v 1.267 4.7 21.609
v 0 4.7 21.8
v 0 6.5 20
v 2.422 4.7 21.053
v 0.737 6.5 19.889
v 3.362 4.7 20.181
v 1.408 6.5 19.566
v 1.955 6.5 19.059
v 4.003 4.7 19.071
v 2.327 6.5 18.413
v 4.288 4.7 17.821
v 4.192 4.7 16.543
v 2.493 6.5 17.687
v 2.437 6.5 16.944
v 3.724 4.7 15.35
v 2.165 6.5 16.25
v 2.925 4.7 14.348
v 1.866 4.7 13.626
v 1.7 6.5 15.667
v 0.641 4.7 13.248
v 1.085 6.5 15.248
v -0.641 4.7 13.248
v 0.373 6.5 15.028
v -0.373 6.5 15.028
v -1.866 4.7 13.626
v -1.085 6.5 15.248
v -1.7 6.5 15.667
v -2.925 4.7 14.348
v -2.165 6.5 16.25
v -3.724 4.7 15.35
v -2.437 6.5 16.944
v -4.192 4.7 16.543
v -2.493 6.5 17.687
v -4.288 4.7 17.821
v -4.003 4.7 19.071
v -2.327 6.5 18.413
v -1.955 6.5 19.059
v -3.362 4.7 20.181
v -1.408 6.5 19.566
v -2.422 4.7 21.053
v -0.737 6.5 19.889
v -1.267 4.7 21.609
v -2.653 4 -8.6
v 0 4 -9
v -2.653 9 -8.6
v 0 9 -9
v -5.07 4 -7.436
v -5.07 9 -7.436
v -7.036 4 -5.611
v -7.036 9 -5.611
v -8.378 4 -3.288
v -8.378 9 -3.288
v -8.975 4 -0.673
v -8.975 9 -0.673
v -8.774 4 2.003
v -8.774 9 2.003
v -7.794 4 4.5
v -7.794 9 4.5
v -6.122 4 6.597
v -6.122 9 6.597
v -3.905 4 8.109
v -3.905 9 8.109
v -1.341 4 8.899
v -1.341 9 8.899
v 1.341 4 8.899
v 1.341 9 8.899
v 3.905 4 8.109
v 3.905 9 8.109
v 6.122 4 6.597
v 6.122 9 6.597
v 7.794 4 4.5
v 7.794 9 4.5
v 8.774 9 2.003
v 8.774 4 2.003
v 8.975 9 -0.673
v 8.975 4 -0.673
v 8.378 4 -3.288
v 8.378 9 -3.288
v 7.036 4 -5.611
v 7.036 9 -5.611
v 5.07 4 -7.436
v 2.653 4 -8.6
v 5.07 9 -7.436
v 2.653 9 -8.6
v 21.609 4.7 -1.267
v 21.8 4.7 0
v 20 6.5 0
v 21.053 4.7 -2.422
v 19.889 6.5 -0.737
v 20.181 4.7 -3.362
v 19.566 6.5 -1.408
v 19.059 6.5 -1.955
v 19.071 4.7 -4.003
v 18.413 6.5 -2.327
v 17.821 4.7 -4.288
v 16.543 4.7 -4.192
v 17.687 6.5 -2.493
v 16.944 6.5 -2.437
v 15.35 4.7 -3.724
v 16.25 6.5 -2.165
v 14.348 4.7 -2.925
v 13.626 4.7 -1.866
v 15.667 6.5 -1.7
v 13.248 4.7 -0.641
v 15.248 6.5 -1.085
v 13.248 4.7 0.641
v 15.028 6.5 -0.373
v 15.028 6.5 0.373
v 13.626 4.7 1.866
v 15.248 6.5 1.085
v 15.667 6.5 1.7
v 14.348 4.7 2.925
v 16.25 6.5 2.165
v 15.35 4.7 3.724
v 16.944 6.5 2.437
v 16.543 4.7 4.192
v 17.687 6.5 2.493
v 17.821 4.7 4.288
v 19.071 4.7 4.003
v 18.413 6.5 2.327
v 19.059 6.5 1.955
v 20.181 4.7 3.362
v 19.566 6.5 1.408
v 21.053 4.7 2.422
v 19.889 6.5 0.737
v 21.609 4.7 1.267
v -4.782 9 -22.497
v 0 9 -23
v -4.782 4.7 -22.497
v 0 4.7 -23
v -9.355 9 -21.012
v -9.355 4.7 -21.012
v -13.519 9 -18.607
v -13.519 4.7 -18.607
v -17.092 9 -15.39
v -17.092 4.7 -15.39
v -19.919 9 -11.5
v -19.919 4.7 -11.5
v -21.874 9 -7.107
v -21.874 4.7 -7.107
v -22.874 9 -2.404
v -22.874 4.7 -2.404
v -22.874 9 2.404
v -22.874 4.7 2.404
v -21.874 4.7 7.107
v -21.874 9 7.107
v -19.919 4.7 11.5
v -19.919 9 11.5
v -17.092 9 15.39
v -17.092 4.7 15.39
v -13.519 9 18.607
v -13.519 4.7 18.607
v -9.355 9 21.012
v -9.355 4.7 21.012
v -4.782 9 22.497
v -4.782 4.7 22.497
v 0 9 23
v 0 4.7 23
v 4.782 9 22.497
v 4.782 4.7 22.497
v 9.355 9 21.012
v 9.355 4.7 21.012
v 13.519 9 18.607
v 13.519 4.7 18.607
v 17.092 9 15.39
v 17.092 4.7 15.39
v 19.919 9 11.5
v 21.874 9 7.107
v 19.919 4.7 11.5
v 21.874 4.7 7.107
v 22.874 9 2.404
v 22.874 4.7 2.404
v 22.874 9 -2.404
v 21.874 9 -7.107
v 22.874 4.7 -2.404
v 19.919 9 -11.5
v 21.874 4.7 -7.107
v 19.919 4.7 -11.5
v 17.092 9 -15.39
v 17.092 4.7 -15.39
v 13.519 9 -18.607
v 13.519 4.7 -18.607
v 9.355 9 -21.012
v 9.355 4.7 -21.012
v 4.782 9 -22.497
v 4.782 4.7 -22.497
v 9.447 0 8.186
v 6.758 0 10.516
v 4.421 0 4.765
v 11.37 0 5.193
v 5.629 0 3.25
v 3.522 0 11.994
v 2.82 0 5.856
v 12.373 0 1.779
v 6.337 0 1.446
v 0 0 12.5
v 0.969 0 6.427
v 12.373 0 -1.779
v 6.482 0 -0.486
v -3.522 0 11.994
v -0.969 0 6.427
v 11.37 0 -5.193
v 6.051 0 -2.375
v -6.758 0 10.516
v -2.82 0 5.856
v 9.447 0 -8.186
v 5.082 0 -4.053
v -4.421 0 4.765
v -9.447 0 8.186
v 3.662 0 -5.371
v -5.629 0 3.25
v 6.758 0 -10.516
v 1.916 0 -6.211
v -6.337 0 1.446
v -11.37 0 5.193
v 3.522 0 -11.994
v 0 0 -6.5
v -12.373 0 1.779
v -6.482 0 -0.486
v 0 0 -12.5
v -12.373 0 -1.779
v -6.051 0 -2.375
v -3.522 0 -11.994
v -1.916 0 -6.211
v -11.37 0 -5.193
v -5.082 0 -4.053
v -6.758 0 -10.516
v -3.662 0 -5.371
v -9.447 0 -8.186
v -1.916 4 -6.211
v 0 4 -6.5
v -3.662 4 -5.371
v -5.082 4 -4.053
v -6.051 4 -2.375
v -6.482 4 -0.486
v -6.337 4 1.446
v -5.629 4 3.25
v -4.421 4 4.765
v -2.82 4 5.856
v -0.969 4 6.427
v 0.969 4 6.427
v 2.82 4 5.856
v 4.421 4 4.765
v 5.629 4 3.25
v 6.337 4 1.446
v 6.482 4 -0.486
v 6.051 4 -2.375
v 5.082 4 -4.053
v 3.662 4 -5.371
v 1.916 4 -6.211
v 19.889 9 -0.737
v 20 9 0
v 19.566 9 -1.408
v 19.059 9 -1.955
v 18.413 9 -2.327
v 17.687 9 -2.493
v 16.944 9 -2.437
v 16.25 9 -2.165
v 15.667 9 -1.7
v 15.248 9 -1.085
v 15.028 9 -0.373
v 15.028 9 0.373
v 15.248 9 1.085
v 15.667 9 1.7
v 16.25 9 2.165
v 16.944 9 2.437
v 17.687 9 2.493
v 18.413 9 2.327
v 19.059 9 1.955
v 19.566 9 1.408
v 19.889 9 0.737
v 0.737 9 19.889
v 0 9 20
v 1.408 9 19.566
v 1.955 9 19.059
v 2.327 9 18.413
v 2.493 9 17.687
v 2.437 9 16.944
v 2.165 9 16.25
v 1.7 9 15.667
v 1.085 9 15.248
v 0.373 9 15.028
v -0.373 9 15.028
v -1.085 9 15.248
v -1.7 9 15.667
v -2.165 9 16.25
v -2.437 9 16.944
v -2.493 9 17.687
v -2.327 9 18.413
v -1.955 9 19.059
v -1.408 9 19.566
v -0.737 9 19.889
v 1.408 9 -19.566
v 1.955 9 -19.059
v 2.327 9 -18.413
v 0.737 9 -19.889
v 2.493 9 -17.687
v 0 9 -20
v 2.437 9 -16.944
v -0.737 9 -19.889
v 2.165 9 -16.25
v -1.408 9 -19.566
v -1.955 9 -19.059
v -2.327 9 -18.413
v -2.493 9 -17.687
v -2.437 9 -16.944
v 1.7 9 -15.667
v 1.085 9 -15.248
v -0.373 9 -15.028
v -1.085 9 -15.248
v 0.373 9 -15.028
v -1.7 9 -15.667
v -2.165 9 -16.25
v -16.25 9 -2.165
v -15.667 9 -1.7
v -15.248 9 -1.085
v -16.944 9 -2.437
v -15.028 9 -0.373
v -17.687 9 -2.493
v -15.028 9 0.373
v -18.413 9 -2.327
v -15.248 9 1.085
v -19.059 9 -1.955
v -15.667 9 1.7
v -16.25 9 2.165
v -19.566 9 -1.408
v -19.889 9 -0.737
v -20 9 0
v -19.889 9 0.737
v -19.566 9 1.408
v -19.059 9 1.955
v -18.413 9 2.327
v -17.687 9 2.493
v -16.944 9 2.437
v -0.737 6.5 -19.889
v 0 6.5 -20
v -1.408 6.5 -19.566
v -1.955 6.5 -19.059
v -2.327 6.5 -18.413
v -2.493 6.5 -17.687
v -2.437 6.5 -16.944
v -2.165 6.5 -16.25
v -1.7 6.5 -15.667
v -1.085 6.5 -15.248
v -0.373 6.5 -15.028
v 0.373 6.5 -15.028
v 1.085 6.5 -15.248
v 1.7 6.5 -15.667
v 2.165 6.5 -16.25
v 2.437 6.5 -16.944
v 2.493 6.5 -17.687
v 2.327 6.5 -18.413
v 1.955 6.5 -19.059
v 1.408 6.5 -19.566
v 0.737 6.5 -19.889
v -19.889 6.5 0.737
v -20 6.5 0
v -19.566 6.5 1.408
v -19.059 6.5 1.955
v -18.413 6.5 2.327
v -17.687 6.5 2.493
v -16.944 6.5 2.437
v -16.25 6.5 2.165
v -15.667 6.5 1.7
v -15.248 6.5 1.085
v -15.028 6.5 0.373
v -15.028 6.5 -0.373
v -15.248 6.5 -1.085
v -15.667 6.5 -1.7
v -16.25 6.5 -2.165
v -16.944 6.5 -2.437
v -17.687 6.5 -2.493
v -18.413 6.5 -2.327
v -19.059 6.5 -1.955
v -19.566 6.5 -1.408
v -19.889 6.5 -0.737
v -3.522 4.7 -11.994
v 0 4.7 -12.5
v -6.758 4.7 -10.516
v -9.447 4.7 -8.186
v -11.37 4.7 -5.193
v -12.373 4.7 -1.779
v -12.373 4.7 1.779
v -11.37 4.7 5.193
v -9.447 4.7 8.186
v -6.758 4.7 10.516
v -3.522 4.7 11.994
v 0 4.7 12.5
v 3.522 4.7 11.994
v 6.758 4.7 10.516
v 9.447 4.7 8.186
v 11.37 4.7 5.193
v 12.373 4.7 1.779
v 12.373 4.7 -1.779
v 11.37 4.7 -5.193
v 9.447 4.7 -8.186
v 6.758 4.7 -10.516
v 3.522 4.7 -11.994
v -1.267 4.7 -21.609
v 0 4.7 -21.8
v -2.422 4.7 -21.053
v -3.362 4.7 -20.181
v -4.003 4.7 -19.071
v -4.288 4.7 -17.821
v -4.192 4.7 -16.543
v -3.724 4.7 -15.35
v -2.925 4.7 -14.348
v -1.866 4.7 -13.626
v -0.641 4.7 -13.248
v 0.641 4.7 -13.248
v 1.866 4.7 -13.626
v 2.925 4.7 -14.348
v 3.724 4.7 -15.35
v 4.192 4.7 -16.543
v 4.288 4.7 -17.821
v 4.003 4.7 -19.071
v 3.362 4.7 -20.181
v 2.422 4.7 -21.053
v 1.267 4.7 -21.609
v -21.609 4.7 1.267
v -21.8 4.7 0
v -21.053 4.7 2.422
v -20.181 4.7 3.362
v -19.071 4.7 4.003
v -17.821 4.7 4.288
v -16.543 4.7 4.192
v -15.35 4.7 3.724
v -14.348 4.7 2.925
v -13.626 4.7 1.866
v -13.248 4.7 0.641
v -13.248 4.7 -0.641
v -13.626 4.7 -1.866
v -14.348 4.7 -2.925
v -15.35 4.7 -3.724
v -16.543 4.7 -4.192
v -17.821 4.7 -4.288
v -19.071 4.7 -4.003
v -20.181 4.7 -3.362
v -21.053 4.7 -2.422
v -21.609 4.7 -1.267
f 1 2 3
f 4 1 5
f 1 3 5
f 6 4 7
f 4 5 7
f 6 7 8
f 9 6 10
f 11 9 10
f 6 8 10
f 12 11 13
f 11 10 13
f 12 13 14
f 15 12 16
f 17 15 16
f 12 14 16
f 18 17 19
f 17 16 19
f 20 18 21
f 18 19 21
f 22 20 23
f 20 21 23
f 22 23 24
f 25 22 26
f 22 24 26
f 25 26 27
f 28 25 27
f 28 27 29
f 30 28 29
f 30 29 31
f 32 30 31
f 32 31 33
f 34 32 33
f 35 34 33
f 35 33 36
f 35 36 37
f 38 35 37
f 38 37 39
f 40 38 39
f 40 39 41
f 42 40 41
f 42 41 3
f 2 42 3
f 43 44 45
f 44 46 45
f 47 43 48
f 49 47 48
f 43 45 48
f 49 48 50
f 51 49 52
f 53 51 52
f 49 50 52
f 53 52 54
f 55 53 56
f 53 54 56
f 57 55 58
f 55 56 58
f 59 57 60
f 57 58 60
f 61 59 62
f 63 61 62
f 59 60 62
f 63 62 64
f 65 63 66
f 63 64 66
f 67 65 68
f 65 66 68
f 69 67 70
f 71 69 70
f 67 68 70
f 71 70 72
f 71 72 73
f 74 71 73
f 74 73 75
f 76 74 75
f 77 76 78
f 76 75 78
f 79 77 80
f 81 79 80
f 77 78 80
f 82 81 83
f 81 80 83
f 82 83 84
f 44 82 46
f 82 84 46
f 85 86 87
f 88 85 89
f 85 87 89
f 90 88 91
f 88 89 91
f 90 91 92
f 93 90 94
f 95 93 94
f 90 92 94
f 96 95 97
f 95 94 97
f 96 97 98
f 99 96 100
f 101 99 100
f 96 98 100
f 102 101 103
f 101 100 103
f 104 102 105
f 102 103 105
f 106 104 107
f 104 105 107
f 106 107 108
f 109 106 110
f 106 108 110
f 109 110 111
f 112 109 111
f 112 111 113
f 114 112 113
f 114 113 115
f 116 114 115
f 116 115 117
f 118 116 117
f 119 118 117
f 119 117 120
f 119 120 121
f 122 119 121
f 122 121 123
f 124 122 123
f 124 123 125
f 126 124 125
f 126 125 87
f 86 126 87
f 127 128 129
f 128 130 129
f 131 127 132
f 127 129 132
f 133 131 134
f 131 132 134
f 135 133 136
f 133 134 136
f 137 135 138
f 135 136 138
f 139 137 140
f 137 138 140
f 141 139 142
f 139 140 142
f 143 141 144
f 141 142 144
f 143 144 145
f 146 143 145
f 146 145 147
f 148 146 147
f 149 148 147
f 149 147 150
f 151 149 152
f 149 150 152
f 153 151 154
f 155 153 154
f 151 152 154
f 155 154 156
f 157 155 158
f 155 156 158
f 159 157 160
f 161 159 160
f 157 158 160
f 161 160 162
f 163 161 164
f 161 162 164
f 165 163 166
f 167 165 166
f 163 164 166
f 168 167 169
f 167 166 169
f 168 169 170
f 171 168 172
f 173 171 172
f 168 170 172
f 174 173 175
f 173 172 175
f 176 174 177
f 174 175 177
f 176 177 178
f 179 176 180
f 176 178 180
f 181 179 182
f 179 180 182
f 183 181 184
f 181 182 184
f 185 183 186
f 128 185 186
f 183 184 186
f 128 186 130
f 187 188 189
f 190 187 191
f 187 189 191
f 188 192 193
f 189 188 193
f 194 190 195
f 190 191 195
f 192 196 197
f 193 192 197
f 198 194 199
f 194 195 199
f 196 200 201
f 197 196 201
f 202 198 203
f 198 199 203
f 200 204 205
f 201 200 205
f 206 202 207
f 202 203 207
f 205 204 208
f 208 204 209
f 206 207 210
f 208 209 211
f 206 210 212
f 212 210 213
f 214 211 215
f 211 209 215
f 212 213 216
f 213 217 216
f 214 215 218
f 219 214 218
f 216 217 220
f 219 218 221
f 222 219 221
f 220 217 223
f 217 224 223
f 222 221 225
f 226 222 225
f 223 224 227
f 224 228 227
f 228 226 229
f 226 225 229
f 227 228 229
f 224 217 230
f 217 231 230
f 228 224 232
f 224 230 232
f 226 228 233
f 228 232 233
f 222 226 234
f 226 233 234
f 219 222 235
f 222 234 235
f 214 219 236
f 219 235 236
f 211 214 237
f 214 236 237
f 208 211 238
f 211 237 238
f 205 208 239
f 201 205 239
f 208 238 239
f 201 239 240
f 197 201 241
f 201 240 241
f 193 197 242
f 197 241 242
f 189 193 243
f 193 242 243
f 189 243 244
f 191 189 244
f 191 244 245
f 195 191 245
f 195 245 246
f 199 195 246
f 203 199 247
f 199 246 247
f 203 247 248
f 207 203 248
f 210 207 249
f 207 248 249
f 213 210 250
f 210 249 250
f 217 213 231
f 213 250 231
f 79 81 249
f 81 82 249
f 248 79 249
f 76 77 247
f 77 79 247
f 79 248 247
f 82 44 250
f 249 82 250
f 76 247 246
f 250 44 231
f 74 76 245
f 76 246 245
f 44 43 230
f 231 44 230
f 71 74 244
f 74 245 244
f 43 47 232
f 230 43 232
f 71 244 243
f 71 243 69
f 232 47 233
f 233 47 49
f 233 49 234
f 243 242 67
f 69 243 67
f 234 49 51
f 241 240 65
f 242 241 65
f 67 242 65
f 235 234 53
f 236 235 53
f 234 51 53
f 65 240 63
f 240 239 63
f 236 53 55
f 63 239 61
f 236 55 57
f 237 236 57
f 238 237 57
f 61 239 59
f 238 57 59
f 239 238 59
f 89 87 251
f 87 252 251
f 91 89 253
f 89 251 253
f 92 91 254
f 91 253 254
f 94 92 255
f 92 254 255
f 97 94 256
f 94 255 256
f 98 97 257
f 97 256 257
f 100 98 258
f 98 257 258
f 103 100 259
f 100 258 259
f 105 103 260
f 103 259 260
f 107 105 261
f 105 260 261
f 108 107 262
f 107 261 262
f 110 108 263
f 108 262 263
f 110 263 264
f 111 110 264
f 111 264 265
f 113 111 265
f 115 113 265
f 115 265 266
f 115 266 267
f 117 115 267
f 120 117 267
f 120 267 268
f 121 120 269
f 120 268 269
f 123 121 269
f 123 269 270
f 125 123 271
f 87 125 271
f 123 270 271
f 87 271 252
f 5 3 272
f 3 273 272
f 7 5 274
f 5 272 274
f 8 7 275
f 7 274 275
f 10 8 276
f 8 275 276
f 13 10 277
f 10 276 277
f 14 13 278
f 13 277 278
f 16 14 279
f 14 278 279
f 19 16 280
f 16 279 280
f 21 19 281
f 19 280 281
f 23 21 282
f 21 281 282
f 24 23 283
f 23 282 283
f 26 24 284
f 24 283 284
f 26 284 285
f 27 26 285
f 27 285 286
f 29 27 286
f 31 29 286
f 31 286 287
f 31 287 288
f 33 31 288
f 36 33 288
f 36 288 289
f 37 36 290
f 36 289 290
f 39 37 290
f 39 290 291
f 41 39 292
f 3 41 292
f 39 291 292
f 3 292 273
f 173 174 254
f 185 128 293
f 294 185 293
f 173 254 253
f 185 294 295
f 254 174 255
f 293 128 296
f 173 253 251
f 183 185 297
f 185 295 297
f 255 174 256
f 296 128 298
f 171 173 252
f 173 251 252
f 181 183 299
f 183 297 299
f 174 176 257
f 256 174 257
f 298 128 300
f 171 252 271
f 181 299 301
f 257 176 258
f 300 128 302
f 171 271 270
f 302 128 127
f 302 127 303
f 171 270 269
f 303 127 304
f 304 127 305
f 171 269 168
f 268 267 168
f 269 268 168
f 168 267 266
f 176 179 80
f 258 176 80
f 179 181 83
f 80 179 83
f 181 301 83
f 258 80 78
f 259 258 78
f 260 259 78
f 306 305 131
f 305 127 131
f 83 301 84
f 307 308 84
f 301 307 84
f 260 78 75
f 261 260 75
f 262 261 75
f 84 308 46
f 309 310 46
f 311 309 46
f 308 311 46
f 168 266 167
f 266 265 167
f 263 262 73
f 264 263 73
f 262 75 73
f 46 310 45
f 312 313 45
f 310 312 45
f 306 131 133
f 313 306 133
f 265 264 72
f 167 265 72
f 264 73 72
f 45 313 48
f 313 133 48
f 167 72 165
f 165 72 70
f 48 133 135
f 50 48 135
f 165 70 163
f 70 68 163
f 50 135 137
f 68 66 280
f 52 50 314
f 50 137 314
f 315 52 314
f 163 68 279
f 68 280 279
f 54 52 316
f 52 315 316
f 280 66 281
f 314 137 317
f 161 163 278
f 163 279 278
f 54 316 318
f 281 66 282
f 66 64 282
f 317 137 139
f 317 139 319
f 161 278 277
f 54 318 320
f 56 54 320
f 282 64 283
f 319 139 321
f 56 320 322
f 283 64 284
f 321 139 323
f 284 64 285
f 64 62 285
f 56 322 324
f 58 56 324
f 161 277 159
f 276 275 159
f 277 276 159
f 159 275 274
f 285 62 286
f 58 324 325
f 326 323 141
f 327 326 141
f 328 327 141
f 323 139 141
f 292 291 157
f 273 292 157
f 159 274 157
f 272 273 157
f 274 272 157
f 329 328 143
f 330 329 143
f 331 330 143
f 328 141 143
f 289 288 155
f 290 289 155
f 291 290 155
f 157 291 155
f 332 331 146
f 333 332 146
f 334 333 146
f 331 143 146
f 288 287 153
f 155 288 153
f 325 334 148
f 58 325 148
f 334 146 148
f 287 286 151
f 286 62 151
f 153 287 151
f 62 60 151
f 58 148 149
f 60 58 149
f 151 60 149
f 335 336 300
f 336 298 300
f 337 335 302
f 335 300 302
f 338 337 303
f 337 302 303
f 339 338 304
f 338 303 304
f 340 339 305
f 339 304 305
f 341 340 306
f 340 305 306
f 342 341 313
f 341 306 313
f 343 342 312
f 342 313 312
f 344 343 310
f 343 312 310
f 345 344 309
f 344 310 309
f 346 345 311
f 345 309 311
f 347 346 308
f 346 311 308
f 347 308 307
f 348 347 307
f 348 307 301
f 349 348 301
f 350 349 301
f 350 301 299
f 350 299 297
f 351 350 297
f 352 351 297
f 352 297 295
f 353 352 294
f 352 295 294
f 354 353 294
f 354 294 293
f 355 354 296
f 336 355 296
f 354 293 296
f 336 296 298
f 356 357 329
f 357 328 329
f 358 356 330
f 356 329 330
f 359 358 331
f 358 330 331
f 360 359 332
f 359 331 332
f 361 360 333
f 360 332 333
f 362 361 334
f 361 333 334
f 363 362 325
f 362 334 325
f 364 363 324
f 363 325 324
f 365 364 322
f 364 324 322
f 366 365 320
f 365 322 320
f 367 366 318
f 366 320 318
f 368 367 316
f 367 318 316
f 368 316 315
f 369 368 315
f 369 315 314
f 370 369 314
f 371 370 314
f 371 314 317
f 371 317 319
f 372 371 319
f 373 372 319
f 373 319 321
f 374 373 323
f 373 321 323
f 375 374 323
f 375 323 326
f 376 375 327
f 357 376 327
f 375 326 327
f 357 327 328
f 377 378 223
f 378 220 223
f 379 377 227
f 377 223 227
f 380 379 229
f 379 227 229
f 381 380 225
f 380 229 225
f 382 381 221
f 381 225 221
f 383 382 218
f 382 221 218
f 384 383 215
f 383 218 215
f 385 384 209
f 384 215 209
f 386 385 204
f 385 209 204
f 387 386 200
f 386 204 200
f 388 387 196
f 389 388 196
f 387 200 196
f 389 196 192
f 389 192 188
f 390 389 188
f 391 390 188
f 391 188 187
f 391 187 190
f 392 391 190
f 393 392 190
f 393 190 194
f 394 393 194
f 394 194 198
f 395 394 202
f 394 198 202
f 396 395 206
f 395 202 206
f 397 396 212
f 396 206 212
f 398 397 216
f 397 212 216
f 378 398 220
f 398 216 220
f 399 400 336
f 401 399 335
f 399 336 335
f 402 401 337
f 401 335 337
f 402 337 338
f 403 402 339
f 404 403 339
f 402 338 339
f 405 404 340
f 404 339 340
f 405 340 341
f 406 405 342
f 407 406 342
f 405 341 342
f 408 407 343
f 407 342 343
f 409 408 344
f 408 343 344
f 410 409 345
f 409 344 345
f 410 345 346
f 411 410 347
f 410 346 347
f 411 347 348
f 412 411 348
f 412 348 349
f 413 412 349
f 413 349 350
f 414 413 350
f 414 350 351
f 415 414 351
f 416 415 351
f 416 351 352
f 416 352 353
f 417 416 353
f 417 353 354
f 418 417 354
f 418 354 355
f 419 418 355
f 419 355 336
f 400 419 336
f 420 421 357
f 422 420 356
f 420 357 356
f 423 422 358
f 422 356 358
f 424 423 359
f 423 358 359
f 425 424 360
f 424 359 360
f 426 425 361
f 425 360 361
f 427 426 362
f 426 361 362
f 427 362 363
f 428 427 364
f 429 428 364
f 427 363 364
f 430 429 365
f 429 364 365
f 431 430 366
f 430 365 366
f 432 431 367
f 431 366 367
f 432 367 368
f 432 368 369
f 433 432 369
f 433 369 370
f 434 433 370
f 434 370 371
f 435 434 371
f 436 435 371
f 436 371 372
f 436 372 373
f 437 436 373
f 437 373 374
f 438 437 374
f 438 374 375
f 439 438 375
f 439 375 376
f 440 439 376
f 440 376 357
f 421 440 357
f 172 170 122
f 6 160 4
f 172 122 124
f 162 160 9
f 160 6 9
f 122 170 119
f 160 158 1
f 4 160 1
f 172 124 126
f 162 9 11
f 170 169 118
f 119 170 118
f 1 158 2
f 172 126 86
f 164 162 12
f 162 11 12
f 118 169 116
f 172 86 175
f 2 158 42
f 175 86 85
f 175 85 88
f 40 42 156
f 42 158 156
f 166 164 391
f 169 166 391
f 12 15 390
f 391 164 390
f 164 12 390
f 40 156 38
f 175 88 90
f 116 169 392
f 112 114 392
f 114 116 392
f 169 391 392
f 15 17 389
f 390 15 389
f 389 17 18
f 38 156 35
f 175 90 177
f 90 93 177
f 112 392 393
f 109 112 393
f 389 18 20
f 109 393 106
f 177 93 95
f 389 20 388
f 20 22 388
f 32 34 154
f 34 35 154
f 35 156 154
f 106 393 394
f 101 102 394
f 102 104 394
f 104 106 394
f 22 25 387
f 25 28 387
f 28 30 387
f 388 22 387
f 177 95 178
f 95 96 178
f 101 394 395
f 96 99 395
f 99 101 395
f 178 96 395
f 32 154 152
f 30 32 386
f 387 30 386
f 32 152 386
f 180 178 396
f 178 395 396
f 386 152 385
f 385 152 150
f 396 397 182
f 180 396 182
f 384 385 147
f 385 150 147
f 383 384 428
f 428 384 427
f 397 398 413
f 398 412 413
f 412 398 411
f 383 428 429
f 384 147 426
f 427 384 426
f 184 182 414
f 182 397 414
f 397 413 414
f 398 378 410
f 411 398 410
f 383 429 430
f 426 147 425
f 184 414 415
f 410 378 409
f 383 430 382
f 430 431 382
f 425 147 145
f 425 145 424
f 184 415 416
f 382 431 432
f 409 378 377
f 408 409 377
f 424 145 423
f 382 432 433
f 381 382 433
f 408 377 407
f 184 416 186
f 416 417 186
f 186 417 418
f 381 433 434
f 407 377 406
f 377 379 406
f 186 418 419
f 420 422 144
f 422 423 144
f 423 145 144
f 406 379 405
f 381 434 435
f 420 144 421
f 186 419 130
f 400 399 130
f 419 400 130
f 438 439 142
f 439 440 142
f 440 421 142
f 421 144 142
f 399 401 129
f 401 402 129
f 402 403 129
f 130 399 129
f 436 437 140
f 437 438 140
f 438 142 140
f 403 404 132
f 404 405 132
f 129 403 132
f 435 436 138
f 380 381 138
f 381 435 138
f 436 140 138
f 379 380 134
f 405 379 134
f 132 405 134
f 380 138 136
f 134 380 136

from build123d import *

# Parameters (mm, degrees)
FORO_SVASATO_PER_VITE_M5_1_D           = 5
FORO_SVASATO_PER_VITE_M5_1_CSINK_D     = 8.6
FORO_SVASATO_PER_VITE_M5_1_CSINK_ANGLE = 90
RIPETIZIONECIRCOLARE1_COUNT            = 4


with BuildPart() as part:
    # Schizzo1 → Rivoluzione1 (revolve)
    with BuildSketch(Plane.XY, mode=Mode.PRIVATE) as rivoluzione1_sk:
        Polygon((6.5, 0), (6.5, 4), (9, 4), (9, 9), (23, 9), (23, 4.7), (12.5, 4.7), (12.5, 0), align=None)
    revolve(rivoluzione1_sk.sketch.rotate(Axis((0, 0, 0), (0, 1, 0)), 90), axis=Axis((0, 0, 0), (0, 1, 0)))

    # Foro svasato per Vite M5-1 (through all)
    with Locations(Plane(origin=(0, 4.7, 0), x_dir=(-1, 0, 0), z_dir=(0, -1, 0))):
        with Locations((-17.5, 0)):
            foro_svasato_per_vite_m5_1 = CounterSinkHole(FORO_SVASATO_PER_VITE_M5_1_D / 2, FORO_SVASATO_PER_VITE_M5_1_CSINK_D / 2, counter_sink_angle=FORO_SVASATO_PER_VITE_M5_1_CSINK_ANGLE)

    # RipetizioneCircolare1: Foro svasato per Vite M5-1 ×4 about axis
    ripetizionecircolare1_axis = Axis((0, 0, 0), (0, 1, 0))
    for i in range(1, RIPETIZIONECIRCOLARE1_COUNT):
        add(foro_svasato_per_vite_m5_1.rotate(ripetizionecircolare1_axis, i * 360 / RIPETIZIONECIRCOLARE1_COUNT), mode=Mode.SUBTRACT)


solid = part.part
